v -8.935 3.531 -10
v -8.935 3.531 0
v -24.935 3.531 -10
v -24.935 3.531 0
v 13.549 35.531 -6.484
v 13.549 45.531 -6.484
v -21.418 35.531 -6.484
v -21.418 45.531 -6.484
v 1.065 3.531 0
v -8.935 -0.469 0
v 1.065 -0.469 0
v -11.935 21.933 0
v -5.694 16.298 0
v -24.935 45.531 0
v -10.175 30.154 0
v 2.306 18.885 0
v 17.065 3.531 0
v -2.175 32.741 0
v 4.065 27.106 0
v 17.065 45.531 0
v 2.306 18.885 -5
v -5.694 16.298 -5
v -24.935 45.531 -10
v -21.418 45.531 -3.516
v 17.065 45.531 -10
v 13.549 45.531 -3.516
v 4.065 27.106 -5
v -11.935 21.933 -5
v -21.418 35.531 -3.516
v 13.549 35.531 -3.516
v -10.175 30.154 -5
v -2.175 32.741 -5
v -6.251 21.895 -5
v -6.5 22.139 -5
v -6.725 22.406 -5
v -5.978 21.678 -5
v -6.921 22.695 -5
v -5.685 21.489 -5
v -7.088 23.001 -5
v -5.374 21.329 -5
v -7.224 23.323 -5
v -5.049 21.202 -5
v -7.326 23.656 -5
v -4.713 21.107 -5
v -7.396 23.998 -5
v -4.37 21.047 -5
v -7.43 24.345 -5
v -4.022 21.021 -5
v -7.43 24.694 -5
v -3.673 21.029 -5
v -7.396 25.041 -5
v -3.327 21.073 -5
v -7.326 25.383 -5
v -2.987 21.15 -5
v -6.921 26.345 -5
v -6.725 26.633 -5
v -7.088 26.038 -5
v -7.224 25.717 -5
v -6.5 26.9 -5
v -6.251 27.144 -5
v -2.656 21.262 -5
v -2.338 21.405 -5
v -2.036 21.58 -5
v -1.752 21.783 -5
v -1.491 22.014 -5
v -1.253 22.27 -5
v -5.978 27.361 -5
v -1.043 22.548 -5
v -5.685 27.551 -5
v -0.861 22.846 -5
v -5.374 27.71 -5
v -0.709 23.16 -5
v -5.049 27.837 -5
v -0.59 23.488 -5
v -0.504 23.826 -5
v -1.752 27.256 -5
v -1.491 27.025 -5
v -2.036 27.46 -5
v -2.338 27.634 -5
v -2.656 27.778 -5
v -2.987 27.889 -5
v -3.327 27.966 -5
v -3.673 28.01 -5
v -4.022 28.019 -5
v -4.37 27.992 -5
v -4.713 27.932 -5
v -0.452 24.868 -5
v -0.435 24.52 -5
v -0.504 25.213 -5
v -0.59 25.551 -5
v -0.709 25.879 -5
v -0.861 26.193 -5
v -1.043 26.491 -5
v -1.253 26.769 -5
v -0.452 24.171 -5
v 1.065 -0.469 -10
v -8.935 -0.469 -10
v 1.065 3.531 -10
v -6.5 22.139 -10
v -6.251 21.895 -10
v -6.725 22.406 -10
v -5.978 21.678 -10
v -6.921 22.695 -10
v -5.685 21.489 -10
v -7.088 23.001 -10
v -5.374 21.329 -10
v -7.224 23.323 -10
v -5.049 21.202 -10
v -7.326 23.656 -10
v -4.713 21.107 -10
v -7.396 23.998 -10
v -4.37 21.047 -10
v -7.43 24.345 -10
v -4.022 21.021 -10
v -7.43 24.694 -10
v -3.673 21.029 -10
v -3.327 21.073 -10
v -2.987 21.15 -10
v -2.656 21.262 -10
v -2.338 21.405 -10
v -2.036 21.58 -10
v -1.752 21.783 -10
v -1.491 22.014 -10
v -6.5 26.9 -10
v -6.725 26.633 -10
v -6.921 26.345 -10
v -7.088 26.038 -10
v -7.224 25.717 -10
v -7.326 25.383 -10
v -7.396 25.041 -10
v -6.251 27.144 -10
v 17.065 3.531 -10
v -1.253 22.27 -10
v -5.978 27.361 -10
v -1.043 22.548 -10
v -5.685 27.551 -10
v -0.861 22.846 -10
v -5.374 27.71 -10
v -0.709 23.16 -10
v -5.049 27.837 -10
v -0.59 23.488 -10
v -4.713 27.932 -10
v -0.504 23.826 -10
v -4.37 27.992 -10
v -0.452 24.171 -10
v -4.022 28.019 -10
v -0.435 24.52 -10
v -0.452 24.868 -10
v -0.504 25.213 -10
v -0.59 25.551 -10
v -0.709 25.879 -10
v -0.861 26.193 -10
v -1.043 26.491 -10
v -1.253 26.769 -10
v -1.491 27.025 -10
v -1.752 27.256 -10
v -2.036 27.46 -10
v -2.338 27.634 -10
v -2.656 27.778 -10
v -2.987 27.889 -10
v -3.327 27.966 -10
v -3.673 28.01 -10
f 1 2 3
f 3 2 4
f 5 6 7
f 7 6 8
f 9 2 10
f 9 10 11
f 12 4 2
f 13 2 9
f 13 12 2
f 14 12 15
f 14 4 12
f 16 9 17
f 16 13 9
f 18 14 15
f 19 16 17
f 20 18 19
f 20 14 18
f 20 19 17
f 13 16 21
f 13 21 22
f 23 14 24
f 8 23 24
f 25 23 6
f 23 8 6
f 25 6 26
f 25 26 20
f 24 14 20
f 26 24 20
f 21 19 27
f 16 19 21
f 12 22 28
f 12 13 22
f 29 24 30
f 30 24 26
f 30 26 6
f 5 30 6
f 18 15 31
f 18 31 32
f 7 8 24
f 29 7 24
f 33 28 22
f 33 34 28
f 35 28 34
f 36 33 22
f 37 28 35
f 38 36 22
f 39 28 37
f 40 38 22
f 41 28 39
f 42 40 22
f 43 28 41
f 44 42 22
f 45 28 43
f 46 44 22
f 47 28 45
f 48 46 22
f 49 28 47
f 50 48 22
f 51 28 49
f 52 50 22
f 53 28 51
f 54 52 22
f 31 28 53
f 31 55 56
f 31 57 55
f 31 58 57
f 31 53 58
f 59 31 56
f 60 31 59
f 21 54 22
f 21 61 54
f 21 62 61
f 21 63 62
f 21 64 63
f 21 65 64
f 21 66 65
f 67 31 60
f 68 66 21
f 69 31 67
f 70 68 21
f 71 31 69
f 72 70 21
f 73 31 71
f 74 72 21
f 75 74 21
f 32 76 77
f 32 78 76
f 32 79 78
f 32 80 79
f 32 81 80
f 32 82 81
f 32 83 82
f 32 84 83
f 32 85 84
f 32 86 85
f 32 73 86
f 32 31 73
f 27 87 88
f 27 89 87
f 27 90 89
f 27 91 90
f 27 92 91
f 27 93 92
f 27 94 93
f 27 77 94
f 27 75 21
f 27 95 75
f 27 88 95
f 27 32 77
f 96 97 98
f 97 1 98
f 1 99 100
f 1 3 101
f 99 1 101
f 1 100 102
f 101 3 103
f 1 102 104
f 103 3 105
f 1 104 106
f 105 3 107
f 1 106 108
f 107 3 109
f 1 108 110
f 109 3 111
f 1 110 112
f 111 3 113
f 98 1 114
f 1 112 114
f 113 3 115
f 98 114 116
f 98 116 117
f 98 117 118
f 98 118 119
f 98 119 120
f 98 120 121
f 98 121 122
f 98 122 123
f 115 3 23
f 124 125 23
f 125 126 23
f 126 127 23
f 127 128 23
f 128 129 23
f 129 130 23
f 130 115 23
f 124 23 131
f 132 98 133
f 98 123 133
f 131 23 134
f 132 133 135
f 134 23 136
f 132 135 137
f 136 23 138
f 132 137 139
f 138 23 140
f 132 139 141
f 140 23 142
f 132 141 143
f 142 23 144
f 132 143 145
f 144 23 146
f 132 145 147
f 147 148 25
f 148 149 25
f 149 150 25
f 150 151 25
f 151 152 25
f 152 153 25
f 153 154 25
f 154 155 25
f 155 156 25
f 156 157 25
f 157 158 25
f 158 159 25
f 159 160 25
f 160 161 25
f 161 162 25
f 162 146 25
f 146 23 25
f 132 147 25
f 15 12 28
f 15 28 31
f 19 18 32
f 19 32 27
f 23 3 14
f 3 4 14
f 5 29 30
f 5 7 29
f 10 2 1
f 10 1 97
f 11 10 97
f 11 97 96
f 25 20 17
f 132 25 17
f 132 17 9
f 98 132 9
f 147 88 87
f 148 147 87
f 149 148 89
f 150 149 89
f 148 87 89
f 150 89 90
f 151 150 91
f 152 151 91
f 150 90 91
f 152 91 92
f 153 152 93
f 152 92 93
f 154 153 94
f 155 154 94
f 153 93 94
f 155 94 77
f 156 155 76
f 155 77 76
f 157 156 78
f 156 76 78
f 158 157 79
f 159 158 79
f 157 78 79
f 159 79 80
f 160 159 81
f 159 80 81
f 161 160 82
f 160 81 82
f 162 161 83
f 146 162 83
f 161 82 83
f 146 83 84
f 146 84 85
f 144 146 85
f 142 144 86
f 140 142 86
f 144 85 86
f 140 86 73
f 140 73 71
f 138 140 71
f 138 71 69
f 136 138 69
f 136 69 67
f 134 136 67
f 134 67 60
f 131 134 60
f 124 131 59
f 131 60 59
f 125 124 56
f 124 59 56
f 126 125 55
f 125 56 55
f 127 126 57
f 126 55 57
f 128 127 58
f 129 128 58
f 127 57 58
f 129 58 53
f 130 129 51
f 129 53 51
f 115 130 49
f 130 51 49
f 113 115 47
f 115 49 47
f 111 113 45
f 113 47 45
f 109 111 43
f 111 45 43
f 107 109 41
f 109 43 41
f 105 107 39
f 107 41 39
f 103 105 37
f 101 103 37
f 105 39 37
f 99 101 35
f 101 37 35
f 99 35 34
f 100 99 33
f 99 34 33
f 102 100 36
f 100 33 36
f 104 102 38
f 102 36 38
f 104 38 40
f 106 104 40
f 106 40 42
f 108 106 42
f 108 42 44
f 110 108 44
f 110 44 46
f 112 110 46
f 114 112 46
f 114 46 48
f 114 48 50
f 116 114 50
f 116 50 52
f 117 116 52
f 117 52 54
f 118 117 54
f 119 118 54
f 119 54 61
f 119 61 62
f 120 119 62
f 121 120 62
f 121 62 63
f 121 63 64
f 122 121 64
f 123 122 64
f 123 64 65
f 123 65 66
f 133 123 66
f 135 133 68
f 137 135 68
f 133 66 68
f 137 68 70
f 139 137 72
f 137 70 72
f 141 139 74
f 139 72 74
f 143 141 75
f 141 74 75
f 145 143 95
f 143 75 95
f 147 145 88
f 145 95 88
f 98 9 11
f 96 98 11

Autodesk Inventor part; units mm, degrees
ref_plane "YZ Plane" through (0, 0, 0) normal (1, 0, 0) x (0, 1, 0)
ref_plane "XZ Plane" through (0, 0, 0) normal (0, 1, 0) x (-1, 0, 0)
ref_plane "XY Plane" through (0, 0, 0) normal (0, 0, 1) x (1, 0, 0)
sketch "Sketch1" plane through (0, 0, 0) normal (0, 0, 1) x (1, 0, 0)
  line L0 (-8.9346, 3.531) -> (-24.9346, 3.531)
  line L1 (-24.9346, 3.531) -> (-24.9346, 45.531)
  line L2 (-24.9346, 45.531) -> (17.0654, 45.531)
  line L3 (17.0654, 45.531) -> (17.0654, 3.531)
  line L4 (17.0654, 3.531) -> (1.0654, 3.531)
  line L5 (4.0654, 27.1063) -> (2.3055, 18.8848)
  line L6 (2.3055, 18.8848) -> (-5.6945, 16.2981)
  line L7 (-5.6945, 16.2981) -> (-11.9346, 21.933)
  line L8 (-11.9346, 21.933) -> (-10.1748, 30.1545)
  line L9 (-10.1748, 30.1545) -> (-2.1748, 32.7412)
  line L10 (-2.1748, 32.7412) -> (4.0654, 27.1063)
  circle A0 centre (-3.9346, 24.5196) radius 3.5
  line L11 (-8.9346, -0.469) -> (1.0654, -0.469)
  line L12 (-8.9346, 3.531) -> (-8.9346, -0.469)
  line L13 (1.0654, 3.531) -> (1.0654, -0.469)
  point P0 (0, 0)
extrude "Extrusion1" add sketch "Sketch1" against normal blind 10 contours L0 L1 L2 L3 L4 L13 L11 L12 | L5 L6 L7 L8 L9 L10 | A0
extrude "Extrusion2" cut sketch "Sketch1" against normal through all contours A0
extrude "Extrusion3" cut sketch "Sketch1" against normal blind 5 contours L5 L6 L7 L8 L9 L10
sketch "Sketch2" plane through (-24.9346, 45.531, 0) normal (0, 1, 0) x (1, 0, 0)
  line L0 (3.5162, 3.5162) -> (38.4838, 3.5162)
  line L1 (38.4838, 3.5162) -> (38.4838, 6.4838)
  line L2 (38.4838, 6.4838) -> (3.5162, 6.4838)
  line L3 (3.5162, 6.4838) -> (3.5162, 3.5162)
  point P0 (24.9346, 0)
  point P1 (0, 10)
  point P2 (42, 0)
extrude "Extrusion4" cut sketch "Sketch2" against normal blind 10
properties part number "gaica cu suportul" material "Gold"
